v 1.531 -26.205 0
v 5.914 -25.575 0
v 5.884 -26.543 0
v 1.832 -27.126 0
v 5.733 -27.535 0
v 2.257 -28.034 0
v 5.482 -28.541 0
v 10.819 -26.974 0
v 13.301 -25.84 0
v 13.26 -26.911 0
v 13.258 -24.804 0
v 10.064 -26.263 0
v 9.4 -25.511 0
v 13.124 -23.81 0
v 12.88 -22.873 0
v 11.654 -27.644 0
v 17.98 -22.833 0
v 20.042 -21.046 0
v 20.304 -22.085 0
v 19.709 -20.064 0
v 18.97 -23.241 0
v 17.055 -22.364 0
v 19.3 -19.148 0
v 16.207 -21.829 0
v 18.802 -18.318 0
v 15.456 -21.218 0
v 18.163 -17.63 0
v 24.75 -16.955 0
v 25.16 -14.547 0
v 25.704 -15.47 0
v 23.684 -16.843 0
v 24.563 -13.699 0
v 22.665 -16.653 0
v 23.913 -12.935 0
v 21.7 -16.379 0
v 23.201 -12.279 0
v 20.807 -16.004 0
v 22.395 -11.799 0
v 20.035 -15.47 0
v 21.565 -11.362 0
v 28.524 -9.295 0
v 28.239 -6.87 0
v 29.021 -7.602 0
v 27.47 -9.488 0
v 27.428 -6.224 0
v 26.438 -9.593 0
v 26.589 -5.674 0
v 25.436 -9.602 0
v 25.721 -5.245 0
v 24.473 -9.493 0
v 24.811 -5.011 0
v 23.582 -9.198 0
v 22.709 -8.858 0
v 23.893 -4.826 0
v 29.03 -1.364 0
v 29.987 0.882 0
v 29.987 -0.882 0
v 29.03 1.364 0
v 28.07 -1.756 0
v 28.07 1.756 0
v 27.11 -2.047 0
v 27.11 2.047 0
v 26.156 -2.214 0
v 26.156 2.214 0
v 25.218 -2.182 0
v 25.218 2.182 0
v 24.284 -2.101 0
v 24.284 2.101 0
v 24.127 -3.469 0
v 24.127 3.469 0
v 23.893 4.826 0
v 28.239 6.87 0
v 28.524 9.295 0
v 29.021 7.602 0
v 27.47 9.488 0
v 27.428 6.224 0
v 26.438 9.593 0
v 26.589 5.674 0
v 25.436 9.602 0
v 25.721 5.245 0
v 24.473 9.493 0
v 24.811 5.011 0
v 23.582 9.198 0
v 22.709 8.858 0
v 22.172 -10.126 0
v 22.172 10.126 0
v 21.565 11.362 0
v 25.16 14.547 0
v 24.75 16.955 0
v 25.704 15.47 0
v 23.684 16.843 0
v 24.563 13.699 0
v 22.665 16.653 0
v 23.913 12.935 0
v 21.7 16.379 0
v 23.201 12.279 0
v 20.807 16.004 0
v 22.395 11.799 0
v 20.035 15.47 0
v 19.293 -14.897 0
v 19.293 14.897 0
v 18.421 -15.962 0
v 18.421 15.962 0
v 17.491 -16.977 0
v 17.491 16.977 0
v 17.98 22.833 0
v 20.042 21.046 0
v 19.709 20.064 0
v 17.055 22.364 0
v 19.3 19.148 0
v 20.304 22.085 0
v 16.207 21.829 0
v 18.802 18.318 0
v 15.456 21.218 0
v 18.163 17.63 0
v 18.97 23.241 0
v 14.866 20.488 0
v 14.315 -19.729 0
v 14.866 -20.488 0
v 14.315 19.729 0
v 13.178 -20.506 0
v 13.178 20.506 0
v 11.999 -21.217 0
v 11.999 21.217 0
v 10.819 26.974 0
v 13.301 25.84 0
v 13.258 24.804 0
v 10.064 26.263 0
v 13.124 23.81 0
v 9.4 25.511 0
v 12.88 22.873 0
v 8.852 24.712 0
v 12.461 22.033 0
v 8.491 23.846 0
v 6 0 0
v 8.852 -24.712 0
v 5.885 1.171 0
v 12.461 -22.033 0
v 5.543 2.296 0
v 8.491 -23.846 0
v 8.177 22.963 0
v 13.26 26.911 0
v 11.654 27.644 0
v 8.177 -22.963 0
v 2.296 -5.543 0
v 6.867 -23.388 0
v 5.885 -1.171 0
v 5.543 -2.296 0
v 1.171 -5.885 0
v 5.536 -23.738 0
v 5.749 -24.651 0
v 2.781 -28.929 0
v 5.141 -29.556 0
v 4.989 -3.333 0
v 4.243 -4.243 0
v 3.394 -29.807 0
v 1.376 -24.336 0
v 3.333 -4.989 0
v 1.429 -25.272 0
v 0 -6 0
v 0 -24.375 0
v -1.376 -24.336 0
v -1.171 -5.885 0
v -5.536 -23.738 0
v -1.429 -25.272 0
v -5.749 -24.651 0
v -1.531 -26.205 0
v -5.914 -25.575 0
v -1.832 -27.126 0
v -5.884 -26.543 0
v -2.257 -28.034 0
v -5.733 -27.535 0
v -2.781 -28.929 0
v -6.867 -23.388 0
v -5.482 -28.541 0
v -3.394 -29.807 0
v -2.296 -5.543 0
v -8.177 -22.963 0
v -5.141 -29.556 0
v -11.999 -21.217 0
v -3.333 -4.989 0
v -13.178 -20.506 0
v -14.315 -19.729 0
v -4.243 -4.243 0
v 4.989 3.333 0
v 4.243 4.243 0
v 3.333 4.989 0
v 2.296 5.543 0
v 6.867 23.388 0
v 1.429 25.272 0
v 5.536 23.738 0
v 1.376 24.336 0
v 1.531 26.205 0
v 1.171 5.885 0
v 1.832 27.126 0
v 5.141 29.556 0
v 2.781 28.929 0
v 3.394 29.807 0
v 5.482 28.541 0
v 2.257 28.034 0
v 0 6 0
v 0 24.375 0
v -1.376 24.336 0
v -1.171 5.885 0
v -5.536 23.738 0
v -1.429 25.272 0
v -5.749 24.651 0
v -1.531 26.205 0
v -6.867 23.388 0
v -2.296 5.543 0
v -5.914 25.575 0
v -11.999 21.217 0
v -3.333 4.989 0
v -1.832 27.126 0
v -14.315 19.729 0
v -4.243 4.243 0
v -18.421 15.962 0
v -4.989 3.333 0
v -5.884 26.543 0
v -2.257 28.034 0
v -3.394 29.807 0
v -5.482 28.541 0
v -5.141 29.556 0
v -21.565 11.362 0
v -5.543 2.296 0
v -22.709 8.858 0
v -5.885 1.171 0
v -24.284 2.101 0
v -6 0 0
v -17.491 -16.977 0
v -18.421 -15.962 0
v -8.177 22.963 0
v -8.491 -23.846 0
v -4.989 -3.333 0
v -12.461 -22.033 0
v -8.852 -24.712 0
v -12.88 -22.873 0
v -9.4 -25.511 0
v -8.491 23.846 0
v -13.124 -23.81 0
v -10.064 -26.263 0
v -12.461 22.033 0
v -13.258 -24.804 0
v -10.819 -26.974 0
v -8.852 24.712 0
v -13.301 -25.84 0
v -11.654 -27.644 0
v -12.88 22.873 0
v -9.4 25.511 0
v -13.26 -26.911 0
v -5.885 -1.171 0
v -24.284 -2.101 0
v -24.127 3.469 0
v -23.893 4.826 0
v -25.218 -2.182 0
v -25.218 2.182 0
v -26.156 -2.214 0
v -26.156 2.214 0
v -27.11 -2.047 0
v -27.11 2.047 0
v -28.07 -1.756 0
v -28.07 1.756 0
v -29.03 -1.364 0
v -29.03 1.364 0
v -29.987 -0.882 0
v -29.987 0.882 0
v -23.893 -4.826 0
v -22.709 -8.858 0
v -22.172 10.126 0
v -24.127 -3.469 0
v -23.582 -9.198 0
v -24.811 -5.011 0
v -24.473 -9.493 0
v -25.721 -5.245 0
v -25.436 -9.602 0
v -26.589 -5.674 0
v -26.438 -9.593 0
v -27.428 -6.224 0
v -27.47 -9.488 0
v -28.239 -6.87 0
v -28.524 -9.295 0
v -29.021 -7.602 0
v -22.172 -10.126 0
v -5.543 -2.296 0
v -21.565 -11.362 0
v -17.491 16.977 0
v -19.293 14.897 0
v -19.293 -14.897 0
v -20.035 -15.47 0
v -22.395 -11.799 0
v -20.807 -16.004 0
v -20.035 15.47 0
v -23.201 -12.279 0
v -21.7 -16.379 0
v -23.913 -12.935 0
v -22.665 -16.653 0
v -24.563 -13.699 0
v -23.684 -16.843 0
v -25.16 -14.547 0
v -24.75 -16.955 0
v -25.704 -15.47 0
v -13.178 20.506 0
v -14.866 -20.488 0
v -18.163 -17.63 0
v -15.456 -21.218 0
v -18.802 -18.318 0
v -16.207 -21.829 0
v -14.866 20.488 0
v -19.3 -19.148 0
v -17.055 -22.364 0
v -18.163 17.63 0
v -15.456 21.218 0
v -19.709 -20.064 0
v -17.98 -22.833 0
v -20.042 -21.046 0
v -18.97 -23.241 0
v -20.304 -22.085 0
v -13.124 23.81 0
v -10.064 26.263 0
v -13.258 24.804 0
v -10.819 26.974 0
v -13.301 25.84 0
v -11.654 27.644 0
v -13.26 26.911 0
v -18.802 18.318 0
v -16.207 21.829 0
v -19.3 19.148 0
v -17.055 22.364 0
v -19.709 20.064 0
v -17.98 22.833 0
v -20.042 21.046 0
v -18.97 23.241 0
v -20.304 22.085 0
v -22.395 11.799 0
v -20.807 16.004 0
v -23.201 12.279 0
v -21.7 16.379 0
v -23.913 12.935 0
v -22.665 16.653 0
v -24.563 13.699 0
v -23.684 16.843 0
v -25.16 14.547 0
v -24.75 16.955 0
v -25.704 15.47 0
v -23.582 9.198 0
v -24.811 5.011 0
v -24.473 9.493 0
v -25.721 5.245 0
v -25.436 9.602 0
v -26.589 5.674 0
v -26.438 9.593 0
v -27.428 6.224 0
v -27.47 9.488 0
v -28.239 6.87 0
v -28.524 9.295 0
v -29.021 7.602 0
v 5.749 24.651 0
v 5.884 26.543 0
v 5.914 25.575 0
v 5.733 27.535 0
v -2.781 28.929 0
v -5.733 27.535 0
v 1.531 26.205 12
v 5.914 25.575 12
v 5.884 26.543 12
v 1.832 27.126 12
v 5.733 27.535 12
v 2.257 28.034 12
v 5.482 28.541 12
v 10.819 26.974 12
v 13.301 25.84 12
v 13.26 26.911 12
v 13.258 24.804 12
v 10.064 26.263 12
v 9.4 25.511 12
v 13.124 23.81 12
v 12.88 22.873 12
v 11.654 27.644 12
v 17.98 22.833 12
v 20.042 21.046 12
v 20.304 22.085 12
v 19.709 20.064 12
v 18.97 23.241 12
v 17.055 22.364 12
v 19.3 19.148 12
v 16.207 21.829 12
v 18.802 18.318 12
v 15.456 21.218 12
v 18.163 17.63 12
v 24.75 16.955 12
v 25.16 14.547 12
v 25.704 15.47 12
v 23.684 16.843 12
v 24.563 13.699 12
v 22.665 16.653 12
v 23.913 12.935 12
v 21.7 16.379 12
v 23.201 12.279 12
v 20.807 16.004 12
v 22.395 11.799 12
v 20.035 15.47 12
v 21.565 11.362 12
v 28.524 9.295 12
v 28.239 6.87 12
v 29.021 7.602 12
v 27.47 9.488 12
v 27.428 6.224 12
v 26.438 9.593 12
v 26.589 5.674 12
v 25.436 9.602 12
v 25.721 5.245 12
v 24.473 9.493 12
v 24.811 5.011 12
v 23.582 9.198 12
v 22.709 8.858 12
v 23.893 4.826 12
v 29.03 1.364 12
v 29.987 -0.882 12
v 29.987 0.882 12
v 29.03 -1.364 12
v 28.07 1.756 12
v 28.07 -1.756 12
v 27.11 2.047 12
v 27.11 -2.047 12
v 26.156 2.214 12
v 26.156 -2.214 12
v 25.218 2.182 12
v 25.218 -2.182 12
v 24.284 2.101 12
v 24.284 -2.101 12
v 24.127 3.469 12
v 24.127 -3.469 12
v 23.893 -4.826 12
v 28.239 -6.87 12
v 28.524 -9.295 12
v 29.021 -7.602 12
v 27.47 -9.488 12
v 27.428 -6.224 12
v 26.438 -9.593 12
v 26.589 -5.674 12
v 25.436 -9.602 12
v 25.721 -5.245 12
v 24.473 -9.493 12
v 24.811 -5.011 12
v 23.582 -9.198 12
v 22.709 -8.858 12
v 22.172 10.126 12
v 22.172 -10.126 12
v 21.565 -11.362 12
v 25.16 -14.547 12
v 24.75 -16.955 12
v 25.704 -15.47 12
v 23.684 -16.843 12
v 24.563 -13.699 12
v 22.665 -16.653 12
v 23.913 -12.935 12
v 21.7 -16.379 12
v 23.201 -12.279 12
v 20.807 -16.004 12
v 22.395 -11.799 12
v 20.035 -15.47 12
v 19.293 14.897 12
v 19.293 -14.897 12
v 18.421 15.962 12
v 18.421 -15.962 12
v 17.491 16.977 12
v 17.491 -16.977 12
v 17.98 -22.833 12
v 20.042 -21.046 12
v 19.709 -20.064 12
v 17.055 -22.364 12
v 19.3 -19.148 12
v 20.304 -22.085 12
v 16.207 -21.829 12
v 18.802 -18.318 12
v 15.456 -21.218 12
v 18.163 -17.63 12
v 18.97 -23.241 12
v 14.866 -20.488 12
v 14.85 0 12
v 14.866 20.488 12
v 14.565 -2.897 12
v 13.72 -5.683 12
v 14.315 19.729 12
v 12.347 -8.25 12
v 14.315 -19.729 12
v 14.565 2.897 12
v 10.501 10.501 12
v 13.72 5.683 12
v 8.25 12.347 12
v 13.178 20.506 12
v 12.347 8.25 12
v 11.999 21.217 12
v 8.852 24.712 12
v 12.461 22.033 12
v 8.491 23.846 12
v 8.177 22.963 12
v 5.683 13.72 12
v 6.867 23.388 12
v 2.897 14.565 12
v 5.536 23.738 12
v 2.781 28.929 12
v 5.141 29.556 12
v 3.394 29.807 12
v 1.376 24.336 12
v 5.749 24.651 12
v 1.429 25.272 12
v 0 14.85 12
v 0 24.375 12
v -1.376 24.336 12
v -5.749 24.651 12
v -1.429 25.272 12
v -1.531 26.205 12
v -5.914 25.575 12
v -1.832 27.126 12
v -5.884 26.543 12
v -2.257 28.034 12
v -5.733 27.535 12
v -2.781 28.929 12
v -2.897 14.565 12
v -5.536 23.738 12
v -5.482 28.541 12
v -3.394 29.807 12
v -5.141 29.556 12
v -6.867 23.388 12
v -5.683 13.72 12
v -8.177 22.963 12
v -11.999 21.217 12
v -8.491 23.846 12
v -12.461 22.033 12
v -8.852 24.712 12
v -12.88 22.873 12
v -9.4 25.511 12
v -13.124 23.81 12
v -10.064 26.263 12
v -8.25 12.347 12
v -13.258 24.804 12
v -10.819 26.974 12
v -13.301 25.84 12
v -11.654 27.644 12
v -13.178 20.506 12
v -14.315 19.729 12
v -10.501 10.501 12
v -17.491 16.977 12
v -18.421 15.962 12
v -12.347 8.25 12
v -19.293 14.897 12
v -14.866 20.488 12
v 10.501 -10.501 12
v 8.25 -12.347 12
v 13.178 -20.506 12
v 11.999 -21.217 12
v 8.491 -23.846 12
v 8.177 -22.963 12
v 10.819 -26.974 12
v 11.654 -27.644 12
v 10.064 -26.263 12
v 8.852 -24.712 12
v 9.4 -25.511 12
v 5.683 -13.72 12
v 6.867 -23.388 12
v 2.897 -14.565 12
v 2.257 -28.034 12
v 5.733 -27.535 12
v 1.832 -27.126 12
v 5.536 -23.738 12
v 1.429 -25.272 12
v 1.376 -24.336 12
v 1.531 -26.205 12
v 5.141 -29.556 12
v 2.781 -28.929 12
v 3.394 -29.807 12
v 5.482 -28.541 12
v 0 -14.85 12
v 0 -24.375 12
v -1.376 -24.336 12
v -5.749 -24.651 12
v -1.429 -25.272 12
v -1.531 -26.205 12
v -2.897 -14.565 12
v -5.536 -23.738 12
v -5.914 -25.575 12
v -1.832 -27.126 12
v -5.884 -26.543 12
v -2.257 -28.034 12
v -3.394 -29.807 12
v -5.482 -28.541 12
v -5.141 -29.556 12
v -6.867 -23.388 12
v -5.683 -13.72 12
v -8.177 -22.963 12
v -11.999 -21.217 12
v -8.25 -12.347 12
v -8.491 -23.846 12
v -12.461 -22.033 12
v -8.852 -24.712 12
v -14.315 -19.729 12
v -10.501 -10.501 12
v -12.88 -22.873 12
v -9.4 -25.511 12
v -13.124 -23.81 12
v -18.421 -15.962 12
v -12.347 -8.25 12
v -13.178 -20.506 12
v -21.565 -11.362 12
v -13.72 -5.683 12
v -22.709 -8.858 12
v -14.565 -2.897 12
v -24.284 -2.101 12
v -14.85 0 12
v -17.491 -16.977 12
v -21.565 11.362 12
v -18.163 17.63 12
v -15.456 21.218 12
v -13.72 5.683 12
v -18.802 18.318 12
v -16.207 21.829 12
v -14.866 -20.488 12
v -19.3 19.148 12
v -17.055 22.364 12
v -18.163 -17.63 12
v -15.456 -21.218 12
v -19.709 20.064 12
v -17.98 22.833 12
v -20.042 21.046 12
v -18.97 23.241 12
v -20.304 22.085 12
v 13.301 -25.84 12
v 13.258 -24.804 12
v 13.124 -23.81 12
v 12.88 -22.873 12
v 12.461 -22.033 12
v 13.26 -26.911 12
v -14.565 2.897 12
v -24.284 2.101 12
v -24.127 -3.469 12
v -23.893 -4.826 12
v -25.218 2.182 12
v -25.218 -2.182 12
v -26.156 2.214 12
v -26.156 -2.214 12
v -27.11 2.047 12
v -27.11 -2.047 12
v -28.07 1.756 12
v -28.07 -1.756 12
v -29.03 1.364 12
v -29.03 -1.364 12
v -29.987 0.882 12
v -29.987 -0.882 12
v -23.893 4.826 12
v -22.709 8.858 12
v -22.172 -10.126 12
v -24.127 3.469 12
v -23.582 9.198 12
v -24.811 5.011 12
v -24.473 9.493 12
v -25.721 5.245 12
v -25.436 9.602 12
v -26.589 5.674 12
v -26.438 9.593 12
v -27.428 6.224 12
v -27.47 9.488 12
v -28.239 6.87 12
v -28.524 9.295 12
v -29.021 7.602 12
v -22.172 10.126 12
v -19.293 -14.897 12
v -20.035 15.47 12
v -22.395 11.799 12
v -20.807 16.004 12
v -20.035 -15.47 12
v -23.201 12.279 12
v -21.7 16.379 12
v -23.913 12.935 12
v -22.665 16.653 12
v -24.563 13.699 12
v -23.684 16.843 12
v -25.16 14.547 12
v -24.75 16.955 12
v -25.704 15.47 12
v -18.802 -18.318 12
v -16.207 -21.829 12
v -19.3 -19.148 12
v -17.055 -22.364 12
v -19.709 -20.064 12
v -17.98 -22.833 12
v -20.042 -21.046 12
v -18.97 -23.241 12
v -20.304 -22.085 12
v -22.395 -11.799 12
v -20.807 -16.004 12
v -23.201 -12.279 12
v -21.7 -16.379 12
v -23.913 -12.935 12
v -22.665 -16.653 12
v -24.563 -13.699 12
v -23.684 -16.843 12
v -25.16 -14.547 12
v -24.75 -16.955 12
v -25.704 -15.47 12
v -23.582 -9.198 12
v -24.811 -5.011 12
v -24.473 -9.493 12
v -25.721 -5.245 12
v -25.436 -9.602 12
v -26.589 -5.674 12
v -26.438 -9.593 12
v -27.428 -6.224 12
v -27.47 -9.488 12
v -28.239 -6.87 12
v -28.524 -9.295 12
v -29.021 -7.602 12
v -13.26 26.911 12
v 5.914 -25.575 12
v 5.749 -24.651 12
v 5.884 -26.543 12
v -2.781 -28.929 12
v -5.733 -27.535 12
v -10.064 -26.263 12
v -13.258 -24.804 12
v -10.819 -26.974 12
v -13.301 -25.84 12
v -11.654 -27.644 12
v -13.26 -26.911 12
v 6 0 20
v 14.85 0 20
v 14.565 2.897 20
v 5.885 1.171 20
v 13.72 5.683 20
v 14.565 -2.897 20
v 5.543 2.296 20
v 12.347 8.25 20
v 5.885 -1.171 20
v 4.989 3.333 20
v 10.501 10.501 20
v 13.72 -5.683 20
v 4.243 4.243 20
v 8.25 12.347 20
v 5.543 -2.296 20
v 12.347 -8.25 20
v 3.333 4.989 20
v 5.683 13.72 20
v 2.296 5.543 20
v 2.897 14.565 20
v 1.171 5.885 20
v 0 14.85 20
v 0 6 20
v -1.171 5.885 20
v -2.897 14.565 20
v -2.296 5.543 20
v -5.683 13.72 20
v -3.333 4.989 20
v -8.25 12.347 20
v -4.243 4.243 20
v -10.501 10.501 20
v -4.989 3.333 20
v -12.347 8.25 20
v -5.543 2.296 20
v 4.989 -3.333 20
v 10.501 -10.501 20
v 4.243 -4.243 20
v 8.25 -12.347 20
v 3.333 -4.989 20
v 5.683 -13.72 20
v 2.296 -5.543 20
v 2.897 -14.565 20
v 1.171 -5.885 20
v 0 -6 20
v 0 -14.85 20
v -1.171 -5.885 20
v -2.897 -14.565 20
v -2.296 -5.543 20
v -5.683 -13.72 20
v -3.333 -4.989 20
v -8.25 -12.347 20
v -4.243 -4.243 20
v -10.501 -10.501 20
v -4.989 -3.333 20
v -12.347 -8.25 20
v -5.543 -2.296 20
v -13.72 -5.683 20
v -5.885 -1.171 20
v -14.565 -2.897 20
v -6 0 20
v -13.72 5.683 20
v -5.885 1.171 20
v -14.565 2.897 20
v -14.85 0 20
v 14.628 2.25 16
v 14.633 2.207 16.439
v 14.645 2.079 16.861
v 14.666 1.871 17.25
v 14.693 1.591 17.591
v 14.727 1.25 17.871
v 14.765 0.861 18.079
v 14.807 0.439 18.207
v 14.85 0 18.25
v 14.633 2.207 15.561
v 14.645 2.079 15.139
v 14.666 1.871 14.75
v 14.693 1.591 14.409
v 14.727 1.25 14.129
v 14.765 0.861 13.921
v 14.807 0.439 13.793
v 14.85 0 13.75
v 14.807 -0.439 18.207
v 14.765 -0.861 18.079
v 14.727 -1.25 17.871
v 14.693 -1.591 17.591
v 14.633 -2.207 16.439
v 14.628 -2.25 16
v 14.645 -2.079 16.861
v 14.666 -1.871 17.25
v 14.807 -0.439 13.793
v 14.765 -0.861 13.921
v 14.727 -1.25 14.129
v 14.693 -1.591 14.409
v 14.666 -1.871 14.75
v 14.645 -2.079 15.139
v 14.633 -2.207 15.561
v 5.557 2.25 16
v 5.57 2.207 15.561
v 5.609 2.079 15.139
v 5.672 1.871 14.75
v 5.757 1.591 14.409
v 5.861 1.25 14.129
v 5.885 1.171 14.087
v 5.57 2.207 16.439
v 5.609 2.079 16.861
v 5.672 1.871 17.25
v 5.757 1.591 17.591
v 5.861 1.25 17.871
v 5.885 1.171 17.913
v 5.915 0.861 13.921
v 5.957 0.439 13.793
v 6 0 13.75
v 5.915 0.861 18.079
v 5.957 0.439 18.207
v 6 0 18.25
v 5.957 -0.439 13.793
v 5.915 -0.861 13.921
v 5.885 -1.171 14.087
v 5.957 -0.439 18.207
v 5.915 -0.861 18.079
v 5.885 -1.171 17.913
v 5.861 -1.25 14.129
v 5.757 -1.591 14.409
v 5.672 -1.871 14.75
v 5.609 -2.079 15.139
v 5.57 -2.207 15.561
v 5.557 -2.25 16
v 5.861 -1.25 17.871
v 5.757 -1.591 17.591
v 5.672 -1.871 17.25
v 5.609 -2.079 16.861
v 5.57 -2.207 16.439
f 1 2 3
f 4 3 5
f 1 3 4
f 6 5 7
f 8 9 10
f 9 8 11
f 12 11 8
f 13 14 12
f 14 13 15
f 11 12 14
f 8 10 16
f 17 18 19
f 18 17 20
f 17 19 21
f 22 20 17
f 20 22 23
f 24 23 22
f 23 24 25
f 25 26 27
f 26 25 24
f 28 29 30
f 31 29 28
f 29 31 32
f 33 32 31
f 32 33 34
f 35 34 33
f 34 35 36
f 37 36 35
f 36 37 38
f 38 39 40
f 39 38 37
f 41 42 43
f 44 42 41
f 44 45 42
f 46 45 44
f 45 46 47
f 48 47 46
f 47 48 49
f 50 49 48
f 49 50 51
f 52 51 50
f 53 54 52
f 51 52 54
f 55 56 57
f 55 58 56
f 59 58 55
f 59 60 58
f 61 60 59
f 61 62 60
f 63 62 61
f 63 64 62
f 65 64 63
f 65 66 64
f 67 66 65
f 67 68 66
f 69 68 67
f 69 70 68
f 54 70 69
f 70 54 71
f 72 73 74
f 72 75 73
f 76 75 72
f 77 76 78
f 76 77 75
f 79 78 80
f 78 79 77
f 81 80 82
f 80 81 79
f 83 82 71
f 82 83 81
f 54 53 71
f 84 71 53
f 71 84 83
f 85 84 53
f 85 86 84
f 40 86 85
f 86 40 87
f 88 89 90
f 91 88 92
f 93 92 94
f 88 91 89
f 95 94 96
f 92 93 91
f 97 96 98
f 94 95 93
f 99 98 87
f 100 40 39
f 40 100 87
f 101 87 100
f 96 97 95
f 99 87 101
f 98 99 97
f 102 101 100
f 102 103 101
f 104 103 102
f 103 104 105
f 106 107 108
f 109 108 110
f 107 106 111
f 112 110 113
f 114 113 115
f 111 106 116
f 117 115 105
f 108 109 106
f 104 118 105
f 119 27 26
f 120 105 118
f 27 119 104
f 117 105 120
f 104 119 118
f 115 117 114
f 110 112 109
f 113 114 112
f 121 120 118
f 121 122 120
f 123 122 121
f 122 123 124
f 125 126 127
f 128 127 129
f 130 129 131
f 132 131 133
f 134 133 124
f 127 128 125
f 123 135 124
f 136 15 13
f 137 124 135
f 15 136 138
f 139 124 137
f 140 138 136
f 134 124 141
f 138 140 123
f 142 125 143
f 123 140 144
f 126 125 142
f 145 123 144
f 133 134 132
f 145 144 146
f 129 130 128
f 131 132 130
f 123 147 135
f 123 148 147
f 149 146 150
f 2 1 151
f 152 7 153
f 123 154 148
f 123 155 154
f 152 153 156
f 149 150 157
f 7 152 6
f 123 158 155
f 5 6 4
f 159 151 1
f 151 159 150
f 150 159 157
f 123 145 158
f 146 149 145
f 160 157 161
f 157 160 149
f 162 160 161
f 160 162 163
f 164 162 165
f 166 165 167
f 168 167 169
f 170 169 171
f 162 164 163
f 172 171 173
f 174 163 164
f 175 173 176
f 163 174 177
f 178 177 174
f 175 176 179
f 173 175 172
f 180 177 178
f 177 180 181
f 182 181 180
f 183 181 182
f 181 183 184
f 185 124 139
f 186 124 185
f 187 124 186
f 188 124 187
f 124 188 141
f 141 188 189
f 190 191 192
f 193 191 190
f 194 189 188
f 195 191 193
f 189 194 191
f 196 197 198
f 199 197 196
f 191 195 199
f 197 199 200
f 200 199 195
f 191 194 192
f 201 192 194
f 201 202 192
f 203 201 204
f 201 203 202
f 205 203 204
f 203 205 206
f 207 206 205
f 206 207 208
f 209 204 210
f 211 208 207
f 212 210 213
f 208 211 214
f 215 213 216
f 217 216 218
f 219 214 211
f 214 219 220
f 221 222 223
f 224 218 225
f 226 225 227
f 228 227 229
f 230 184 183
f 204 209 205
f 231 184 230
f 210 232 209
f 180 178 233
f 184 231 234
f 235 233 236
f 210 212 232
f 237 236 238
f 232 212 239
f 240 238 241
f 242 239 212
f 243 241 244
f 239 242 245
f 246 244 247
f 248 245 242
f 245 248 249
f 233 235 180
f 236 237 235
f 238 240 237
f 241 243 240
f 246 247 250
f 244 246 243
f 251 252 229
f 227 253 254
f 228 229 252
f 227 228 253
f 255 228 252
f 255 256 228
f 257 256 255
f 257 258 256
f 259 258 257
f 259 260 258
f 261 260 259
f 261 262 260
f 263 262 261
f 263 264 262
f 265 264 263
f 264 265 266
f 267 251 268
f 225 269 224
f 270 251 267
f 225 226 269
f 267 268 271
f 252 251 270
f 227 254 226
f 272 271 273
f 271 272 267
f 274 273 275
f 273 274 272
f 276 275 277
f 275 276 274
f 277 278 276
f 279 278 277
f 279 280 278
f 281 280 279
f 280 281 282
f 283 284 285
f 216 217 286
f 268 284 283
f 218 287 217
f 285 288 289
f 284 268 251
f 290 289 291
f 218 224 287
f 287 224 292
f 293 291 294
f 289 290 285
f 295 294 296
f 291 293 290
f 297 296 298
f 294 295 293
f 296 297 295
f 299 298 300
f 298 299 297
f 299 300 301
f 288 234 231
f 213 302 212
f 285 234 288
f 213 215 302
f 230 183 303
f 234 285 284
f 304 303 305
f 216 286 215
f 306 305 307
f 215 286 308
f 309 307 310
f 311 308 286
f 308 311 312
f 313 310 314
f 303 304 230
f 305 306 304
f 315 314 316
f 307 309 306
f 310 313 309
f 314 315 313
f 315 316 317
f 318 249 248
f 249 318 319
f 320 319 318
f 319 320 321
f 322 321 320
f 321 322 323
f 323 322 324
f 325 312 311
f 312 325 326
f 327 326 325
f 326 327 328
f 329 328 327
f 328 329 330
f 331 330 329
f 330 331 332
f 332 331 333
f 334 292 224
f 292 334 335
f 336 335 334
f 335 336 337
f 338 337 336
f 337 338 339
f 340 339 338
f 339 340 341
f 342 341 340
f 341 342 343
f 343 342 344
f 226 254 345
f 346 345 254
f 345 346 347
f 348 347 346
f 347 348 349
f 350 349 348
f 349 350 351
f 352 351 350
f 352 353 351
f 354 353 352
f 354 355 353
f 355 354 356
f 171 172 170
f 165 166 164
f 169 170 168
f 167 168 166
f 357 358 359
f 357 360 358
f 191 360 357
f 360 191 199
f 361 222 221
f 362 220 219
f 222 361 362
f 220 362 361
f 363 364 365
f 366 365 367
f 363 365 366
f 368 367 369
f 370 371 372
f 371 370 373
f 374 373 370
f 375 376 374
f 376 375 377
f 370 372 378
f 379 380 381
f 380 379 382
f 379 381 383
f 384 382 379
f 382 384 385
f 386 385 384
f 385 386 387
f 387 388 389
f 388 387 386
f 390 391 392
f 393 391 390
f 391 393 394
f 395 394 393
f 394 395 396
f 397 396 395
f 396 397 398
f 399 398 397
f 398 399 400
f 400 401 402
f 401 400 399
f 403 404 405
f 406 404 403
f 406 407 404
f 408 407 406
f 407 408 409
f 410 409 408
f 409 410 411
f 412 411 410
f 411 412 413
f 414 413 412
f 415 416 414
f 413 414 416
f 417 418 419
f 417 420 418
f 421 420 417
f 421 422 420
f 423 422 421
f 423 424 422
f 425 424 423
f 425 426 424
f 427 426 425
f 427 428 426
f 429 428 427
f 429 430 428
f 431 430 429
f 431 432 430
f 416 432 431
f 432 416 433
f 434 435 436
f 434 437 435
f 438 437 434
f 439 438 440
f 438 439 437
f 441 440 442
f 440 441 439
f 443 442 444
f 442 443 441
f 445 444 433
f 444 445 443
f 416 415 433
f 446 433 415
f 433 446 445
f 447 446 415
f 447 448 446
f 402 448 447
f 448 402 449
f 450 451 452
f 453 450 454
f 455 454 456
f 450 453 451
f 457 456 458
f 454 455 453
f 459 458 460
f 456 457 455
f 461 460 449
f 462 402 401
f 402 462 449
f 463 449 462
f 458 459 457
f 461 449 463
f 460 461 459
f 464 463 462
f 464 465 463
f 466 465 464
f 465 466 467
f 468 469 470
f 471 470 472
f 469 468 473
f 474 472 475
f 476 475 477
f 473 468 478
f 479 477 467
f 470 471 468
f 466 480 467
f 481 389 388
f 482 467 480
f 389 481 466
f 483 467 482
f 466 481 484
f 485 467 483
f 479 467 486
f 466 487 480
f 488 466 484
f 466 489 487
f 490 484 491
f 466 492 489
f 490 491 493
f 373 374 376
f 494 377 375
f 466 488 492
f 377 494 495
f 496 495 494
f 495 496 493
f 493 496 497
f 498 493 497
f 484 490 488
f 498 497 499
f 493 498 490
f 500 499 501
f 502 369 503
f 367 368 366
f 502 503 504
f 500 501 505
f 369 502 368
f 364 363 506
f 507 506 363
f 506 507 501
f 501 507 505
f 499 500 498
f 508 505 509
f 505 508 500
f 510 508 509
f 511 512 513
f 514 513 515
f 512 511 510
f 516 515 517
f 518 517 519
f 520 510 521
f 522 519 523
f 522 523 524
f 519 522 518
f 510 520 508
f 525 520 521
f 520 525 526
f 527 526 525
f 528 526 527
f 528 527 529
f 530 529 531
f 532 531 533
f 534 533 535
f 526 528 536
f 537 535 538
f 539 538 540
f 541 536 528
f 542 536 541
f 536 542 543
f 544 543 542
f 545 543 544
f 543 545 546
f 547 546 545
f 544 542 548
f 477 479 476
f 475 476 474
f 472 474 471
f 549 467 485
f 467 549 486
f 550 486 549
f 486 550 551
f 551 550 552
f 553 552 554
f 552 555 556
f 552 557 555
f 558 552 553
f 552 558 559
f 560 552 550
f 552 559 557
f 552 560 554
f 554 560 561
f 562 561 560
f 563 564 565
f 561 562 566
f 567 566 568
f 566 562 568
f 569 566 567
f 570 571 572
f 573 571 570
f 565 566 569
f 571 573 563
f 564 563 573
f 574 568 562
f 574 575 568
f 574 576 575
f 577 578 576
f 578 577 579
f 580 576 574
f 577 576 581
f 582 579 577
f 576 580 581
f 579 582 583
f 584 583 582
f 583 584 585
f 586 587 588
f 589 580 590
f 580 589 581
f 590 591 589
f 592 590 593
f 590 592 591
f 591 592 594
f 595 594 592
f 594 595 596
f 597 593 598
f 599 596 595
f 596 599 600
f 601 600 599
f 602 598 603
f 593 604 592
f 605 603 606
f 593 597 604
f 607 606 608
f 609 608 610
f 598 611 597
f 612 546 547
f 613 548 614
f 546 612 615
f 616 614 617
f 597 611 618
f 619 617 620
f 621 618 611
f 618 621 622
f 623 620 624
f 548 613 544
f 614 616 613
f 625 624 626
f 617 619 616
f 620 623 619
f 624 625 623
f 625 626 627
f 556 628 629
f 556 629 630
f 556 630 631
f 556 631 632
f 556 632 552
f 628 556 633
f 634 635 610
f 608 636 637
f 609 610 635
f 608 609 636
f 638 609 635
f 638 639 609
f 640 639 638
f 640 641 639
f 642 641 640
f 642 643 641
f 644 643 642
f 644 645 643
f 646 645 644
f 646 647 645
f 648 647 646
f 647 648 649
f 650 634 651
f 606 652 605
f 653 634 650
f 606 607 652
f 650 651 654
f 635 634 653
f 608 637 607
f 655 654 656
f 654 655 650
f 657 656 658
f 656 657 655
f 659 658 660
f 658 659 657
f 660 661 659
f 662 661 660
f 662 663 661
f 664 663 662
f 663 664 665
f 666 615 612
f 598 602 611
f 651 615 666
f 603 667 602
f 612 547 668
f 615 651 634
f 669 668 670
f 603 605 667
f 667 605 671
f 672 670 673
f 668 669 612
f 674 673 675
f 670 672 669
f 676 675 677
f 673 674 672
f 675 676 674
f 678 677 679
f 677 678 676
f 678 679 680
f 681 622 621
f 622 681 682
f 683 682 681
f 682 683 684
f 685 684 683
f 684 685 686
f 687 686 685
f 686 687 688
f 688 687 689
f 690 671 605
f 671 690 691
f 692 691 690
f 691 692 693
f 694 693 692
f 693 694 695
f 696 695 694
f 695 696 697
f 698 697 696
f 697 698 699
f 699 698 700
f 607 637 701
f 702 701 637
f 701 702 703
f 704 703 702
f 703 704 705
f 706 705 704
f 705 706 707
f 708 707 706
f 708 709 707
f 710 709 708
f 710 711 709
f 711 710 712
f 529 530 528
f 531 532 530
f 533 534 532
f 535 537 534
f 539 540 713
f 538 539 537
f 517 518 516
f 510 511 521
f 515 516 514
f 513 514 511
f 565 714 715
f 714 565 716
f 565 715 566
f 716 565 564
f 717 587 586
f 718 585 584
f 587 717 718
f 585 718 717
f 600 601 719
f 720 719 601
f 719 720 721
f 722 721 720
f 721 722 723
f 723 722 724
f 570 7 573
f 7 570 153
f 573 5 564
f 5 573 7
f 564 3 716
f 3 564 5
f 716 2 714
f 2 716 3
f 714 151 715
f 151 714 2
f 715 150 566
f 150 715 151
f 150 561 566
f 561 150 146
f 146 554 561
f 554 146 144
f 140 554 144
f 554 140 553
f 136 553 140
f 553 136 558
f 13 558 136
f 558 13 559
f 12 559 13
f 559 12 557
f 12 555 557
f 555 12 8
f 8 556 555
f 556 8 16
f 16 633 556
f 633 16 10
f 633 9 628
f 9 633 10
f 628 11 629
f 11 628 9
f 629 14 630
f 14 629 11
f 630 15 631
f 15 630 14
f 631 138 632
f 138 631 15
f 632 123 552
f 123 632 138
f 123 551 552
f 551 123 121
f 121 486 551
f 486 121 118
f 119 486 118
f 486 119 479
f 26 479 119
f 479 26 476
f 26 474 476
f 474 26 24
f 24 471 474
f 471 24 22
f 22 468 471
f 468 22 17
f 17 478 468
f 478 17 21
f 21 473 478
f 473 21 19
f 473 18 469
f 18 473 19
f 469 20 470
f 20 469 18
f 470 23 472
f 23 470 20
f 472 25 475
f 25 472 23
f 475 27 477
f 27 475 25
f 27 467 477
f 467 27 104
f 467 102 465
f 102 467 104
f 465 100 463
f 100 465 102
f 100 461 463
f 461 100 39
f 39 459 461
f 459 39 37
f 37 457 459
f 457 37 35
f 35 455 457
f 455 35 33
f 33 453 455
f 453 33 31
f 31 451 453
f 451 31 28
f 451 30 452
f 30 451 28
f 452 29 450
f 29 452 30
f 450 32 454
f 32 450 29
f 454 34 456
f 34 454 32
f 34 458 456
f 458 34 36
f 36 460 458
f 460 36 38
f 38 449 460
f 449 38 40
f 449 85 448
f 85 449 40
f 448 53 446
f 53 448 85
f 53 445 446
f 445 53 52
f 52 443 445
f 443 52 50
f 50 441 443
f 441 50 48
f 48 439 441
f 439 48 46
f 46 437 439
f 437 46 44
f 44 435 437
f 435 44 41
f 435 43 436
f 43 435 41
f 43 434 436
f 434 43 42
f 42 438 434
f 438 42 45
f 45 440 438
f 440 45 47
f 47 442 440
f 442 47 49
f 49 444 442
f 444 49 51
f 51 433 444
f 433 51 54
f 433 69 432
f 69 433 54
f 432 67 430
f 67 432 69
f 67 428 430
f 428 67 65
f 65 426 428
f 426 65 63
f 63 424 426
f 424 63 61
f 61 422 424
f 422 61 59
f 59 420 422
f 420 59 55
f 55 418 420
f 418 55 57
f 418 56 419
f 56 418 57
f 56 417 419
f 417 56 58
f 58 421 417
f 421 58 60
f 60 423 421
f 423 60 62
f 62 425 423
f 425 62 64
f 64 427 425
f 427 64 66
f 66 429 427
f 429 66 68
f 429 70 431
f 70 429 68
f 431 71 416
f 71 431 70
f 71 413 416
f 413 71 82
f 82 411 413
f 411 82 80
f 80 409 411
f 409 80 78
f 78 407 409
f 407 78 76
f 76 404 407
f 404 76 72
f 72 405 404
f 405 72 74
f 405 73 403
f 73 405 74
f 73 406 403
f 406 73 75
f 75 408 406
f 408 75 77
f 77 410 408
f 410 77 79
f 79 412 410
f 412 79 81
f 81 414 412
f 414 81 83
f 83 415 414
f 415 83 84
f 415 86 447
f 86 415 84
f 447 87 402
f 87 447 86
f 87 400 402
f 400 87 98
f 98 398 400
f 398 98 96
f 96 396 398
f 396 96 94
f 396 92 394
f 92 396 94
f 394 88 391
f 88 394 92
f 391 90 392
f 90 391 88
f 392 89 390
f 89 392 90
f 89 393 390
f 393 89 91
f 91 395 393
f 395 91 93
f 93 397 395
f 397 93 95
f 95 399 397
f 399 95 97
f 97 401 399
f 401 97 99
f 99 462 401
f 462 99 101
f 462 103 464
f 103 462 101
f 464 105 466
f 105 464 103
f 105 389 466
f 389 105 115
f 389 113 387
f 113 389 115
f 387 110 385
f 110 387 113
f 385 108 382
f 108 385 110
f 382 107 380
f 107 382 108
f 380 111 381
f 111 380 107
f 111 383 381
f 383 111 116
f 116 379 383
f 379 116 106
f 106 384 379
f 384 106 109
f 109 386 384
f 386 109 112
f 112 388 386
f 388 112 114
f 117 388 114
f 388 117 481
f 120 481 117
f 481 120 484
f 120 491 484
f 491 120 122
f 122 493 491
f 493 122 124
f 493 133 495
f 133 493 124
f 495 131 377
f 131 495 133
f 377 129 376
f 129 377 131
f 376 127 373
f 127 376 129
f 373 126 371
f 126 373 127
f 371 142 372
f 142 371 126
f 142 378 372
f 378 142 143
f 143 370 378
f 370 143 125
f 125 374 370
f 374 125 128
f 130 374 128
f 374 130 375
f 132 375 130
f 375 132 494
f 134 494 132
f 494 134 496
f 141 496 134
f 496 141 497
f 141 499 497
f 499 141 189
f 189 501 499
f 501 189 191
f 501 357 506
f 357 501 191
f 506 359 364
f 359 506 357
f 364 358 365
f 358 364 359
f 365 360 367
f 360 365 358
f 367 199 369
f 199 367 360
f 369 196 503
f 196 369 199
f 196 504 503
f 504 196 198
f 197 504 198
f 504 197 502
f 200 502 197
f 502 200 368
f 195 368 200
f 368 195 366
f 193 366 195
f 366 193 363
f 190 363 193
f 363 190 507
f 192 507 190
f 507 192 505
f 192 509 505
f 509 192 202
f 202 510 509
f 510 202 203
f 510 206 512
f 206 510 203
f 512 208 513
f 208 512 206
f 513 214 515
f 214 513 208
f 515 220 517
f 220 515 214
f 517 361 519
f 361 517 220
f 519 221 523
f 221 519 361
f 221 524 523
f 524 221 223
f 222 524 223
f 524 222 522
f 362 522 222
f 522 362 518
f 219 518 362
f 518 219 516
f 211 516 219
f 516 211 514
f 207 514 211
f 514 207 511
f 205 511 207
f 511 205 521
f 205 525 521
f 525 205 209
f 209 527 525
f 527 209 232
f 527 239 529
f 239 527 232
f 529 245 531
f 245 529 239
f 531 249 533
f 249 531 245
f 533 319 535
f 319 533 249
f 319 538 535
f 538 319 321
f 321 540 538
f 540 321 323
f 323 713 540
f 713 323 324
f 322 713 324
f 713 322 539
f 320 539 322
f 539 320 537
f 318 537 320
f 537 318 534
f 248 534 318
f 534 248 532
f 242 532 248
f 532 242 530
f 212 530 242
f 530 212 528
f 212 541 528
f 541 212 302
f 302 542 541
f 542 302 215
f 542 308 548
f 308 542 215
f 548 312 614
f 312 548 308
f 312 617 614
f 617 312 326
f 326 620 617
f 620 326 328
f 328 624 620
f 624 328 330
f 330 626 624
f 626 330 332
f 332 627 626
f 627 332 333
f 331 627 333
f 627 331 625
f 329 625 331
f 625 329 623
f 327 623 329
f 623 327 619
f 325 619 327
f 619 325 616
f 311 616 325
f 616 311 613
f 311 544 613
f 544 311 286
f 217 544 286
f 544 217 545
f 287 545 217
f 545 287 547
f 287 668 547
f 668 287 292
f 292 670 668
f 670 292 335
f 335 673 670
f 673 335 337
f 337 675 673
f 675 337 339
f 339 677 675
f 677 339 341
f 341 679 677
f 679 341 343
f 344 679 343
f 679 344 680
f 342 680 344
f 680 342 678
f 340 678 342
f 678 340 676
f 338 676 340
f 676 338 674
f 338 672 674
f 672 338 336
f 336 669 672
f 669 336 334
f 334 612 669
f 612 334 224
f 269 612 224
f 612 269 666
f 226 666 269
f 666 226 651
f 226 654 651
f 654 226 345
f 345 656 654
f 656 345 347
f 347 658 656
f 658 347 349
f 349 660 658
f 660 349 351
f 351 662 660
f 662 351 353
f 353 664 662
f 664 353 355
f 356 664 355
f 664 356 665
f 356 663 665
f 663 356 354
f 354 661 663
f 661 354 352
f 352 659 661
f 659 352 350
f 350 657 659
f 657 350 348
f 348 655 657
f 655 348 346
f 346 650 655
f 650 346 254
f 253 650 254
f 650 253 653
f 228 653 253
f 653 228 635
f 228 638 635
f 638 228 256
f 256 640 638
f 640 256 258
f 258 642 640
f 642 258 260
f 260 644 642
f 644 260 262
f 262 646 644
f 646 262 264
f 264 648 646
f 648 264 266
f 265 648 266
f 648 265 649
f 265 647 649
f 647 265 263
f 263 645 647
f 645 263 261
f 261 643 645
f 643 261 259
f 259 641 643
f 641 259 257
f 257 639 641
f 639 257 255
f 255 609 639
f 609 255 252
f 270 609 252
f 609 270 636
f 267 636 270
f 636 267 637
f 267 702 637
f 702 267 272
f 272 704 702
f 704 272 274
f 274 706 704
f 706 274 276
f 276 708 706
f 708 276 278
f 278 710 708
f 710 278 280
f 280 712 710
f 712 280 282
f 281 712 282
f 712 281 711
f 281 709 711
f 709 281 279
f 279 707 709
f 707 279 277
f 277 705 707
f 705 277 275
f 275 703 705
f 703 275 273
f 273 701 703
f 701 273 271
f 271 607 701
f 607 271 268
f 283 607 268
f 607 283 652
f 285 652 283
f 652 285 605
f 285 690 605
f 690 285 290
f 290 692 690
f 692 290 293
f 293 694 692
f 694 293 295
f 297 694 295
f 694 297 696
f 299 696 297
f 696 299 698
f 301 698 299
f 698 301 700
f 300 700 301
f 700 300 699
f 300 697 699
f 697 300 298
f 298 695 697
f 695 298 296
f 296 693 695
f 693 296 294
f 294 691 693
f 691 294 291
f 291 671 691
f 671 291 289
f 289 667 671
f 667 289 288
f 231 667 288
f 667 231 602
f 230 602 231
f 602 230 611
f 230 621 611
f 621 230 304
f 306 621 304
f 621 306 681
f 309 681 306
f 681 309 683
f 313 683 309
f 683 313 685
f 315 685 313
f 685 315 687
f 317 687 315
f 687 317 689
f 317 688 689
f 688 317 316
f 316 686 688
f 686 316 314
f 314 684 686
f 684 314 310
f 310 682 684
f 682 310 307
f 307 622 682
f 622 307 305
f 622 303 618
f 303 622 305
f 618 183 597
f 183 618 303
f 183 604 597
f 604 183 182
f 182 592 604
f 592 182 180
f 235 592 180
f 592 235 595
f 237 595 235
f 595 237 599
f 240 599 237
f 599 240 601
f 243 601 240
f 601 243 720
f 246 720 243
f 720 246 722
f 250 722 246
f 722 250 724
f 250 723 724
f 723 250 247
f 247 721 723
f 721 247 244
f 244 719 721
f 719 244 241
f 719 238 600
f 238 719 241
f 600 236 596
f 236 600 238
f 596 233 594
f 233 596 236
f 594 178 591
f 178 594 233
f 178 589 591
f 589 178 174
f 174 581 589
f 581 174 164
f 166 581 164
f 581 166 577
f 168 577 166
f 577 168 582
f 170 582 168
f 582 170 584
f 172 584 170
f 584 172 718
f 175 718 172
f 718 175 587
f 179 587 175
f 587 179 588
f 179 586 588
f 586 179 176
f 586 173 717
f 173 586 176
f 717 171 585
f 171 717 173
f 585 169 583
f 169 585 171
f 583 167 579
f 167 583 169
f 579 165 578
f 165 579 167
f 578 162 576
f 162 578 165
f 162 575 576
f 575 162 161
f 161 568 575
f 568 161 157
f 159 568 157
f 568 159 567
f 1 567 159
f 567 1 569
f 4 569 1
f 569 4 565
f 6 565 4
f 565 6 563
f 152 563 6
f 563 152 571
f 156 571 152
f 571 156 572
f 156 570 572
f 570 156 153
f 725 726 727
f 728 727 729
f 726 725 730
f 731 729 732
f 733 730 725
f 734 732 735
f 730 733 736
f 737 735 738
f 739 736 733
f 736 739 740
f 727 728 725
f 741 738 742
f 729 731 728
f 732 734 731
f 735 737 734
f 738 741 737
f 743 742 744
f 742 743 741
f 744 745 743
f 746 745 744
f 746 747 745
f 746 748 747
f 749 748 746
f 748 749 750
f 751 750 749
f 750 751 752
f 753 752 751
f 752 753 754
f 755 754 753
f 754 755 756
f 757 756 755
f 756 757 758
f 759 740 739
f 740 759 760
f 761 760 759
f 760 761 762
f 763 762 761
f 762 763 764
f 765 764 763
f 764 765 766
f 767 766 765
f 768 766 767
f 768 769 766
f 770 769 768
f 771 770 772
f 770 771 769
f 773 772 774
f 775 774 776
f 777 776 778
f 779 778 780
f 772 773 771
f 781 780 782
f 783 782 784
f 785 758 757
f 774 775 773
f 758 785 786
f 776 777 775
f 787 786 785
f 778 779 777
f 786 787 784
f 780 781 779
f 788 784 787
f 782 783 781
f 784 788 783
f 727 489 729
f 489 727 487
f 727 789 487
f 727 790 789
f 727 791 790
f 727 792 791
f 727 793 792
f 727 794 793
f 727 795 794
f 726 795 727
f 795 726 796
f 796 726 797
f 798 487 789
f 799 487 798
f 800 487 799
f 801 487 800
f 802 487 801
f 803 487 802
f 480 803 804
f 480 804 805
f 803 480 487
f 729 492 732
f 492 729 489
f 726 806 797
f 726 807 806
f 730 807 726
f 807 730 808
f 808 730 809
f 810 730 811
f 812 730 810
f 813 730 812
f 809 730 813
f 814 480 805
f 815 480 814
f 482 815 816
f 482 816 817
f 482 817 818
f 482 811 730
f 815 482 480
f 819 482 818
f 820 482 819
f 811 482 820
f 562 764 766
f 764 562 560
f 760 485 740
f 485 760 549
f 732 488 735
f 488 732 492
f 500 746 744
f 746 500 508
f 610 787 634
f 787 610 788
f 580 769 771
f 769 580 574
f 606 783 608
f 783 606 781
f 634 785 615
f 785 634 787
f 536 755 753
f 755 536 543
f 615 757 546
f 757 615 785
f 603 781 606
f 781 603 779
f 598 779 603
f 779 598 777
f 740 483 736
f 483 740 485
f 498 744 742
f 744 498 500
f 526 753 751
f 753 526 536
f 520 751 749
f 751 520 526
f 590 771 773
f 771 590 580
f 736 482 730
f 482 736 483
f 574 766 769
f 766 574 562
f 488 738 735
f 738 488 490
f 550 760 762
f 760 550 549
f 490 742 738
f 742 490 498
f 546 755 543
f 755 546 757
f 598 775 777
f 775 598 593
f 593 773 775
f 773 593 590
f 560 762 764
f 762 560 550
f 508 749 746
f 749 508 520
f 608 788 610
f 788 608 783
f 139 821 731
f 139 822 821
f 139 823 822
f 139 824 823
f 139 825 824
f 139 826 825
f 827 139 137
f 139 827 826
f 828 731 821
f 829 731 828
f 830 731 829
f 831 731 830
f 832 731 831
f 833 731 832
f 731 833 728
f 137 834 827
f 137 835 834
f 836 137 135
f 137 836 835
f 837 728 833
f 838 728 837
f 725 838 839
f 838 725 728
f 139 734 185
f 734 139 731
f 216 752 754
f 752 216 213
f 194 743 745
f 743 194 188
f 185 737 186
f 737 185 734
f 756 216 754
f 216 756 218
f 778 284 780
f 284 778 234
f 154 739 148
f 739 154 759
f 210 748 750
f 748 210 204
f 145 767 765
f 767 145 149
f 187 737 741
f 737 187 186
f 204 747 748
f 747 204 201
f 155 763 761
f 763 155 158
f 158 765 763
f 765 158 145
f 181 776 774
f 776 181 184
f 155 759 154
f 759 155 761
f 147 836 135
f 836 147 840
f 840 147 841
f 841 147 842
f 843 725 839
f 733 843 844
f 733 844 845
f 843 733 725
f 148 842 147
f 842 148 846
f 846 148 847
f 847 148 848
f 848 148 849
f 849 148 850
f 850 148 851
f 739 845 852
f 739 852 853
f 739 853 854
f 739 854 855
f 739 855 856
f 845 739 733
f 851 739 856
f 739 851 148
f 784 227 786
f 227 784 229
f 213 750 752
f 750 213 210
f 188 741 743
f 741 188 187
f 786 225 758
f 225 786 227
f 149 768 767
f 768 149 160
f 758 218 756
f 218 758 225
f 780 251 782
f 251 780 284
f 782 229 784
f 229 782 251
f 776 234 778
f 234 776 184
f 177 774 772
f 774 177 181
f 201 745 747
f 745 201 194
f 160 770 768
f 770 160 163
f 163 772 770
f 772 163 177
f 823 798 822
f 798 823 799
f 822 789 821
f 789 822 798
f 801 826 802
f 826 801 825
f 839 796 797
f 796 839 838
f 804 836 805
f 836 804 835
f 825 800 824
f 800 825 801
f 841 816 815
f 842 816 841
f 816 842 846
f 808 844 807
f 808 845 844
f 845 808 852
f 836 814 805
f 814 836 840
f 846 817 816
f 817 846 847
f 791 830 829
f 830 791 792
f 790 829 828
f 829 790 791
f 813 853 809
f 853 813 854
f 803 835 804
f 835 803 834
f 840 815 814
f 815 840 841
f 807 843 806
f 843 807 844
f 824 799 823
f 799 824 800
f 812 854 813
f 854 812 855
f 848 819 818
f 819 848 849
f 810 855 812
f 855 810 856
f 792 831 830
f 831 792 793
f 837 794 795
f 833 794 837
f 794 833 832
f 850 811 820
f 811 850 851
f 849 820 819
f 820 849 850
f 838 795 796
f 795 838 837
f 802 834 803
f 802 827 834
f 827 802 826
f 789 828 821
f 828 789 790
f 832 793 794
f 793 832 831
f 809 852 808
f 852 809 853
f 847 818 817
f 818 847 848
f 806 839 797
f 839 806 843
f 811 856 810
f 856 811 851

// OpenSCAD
$fn = 32;

// ----------------------------------------------------------------------
// Spur gear: m=2.5 z=22, 60 mm tip diameter x 20 mm
// ----------------------------------------------------------------------

// --- parameters (mm) ---
gear_module = 2.5;        // module
tooth_count = 22;         // number of teeth
gear_w = 12;              // face width
pa = 20;                  // pressure angle, deg
bore = 12;                // shaft bore
hub_dia = 29.7;           // hub diameter
hub_len = 8;              // hub above the face
set_d = 4.5;              // set screw tap hole
set_z = 16;               // set screw height

/* --- involute profile --- */
pitch_r = gear_module * tooth_count / 2;
base_r = pitch_r * cos(pa);
tip_r = pitch_r + gear_module;
root_r = pitch_r - 1.25 * gear_module;
flank_steps = 6;

function inv_deg(a) = (tan(a) - a * PI / 180) * 180 / PI;
function flank_r(i) = root_r + (tip_r - root_r) * i / flank_steps;
function half_angle(r) = 90 / tooth_count + inv_deg(pa) - inv_deg(acos(min(1, base_r / r)));
function tooth_pt(k, i, side) =
    let (r = flank_r(i), a = k * 360 / tooth_count + side * half_angle(r))
    [r * cos(a), r * sin(a)];

module tooth_profile() {
  polygon(points = [
    for (k = [0 : tooth_count - 1])
      each [
        for (i = [0 : flank_steps]) tooth_pt(k, i, -1),
        for (i = [flank_steps : -1 : 0]) tooth_pt(k, i, 1),
        let (ta = (k + 0.5) * 360 / tooth_count)
          [root_r * cos(ta), root_r * sin(ta)]
      ]
  ]);
}

module gear_disc() {
  linear_extrude(height = gear_w) tooth_profile();
}

module hub_boss() {
  translate([0, 0, gear_w - 1]) cylinder(h = hub_len + 1, d = hub_dia);
}

difference() {
  union() {
    gear_disc();
    hub_boss();
  }
  translate([0, 0, -1]) cylinder(h = gear_w + hub_len + 3, d = bore);
  /* set screw, drilled radially */
  translate([-1, 0, set_z]) rotate([0, 90, 0]) cylinder(h = hub_dia / 2 + 3, d = set_d);
}
